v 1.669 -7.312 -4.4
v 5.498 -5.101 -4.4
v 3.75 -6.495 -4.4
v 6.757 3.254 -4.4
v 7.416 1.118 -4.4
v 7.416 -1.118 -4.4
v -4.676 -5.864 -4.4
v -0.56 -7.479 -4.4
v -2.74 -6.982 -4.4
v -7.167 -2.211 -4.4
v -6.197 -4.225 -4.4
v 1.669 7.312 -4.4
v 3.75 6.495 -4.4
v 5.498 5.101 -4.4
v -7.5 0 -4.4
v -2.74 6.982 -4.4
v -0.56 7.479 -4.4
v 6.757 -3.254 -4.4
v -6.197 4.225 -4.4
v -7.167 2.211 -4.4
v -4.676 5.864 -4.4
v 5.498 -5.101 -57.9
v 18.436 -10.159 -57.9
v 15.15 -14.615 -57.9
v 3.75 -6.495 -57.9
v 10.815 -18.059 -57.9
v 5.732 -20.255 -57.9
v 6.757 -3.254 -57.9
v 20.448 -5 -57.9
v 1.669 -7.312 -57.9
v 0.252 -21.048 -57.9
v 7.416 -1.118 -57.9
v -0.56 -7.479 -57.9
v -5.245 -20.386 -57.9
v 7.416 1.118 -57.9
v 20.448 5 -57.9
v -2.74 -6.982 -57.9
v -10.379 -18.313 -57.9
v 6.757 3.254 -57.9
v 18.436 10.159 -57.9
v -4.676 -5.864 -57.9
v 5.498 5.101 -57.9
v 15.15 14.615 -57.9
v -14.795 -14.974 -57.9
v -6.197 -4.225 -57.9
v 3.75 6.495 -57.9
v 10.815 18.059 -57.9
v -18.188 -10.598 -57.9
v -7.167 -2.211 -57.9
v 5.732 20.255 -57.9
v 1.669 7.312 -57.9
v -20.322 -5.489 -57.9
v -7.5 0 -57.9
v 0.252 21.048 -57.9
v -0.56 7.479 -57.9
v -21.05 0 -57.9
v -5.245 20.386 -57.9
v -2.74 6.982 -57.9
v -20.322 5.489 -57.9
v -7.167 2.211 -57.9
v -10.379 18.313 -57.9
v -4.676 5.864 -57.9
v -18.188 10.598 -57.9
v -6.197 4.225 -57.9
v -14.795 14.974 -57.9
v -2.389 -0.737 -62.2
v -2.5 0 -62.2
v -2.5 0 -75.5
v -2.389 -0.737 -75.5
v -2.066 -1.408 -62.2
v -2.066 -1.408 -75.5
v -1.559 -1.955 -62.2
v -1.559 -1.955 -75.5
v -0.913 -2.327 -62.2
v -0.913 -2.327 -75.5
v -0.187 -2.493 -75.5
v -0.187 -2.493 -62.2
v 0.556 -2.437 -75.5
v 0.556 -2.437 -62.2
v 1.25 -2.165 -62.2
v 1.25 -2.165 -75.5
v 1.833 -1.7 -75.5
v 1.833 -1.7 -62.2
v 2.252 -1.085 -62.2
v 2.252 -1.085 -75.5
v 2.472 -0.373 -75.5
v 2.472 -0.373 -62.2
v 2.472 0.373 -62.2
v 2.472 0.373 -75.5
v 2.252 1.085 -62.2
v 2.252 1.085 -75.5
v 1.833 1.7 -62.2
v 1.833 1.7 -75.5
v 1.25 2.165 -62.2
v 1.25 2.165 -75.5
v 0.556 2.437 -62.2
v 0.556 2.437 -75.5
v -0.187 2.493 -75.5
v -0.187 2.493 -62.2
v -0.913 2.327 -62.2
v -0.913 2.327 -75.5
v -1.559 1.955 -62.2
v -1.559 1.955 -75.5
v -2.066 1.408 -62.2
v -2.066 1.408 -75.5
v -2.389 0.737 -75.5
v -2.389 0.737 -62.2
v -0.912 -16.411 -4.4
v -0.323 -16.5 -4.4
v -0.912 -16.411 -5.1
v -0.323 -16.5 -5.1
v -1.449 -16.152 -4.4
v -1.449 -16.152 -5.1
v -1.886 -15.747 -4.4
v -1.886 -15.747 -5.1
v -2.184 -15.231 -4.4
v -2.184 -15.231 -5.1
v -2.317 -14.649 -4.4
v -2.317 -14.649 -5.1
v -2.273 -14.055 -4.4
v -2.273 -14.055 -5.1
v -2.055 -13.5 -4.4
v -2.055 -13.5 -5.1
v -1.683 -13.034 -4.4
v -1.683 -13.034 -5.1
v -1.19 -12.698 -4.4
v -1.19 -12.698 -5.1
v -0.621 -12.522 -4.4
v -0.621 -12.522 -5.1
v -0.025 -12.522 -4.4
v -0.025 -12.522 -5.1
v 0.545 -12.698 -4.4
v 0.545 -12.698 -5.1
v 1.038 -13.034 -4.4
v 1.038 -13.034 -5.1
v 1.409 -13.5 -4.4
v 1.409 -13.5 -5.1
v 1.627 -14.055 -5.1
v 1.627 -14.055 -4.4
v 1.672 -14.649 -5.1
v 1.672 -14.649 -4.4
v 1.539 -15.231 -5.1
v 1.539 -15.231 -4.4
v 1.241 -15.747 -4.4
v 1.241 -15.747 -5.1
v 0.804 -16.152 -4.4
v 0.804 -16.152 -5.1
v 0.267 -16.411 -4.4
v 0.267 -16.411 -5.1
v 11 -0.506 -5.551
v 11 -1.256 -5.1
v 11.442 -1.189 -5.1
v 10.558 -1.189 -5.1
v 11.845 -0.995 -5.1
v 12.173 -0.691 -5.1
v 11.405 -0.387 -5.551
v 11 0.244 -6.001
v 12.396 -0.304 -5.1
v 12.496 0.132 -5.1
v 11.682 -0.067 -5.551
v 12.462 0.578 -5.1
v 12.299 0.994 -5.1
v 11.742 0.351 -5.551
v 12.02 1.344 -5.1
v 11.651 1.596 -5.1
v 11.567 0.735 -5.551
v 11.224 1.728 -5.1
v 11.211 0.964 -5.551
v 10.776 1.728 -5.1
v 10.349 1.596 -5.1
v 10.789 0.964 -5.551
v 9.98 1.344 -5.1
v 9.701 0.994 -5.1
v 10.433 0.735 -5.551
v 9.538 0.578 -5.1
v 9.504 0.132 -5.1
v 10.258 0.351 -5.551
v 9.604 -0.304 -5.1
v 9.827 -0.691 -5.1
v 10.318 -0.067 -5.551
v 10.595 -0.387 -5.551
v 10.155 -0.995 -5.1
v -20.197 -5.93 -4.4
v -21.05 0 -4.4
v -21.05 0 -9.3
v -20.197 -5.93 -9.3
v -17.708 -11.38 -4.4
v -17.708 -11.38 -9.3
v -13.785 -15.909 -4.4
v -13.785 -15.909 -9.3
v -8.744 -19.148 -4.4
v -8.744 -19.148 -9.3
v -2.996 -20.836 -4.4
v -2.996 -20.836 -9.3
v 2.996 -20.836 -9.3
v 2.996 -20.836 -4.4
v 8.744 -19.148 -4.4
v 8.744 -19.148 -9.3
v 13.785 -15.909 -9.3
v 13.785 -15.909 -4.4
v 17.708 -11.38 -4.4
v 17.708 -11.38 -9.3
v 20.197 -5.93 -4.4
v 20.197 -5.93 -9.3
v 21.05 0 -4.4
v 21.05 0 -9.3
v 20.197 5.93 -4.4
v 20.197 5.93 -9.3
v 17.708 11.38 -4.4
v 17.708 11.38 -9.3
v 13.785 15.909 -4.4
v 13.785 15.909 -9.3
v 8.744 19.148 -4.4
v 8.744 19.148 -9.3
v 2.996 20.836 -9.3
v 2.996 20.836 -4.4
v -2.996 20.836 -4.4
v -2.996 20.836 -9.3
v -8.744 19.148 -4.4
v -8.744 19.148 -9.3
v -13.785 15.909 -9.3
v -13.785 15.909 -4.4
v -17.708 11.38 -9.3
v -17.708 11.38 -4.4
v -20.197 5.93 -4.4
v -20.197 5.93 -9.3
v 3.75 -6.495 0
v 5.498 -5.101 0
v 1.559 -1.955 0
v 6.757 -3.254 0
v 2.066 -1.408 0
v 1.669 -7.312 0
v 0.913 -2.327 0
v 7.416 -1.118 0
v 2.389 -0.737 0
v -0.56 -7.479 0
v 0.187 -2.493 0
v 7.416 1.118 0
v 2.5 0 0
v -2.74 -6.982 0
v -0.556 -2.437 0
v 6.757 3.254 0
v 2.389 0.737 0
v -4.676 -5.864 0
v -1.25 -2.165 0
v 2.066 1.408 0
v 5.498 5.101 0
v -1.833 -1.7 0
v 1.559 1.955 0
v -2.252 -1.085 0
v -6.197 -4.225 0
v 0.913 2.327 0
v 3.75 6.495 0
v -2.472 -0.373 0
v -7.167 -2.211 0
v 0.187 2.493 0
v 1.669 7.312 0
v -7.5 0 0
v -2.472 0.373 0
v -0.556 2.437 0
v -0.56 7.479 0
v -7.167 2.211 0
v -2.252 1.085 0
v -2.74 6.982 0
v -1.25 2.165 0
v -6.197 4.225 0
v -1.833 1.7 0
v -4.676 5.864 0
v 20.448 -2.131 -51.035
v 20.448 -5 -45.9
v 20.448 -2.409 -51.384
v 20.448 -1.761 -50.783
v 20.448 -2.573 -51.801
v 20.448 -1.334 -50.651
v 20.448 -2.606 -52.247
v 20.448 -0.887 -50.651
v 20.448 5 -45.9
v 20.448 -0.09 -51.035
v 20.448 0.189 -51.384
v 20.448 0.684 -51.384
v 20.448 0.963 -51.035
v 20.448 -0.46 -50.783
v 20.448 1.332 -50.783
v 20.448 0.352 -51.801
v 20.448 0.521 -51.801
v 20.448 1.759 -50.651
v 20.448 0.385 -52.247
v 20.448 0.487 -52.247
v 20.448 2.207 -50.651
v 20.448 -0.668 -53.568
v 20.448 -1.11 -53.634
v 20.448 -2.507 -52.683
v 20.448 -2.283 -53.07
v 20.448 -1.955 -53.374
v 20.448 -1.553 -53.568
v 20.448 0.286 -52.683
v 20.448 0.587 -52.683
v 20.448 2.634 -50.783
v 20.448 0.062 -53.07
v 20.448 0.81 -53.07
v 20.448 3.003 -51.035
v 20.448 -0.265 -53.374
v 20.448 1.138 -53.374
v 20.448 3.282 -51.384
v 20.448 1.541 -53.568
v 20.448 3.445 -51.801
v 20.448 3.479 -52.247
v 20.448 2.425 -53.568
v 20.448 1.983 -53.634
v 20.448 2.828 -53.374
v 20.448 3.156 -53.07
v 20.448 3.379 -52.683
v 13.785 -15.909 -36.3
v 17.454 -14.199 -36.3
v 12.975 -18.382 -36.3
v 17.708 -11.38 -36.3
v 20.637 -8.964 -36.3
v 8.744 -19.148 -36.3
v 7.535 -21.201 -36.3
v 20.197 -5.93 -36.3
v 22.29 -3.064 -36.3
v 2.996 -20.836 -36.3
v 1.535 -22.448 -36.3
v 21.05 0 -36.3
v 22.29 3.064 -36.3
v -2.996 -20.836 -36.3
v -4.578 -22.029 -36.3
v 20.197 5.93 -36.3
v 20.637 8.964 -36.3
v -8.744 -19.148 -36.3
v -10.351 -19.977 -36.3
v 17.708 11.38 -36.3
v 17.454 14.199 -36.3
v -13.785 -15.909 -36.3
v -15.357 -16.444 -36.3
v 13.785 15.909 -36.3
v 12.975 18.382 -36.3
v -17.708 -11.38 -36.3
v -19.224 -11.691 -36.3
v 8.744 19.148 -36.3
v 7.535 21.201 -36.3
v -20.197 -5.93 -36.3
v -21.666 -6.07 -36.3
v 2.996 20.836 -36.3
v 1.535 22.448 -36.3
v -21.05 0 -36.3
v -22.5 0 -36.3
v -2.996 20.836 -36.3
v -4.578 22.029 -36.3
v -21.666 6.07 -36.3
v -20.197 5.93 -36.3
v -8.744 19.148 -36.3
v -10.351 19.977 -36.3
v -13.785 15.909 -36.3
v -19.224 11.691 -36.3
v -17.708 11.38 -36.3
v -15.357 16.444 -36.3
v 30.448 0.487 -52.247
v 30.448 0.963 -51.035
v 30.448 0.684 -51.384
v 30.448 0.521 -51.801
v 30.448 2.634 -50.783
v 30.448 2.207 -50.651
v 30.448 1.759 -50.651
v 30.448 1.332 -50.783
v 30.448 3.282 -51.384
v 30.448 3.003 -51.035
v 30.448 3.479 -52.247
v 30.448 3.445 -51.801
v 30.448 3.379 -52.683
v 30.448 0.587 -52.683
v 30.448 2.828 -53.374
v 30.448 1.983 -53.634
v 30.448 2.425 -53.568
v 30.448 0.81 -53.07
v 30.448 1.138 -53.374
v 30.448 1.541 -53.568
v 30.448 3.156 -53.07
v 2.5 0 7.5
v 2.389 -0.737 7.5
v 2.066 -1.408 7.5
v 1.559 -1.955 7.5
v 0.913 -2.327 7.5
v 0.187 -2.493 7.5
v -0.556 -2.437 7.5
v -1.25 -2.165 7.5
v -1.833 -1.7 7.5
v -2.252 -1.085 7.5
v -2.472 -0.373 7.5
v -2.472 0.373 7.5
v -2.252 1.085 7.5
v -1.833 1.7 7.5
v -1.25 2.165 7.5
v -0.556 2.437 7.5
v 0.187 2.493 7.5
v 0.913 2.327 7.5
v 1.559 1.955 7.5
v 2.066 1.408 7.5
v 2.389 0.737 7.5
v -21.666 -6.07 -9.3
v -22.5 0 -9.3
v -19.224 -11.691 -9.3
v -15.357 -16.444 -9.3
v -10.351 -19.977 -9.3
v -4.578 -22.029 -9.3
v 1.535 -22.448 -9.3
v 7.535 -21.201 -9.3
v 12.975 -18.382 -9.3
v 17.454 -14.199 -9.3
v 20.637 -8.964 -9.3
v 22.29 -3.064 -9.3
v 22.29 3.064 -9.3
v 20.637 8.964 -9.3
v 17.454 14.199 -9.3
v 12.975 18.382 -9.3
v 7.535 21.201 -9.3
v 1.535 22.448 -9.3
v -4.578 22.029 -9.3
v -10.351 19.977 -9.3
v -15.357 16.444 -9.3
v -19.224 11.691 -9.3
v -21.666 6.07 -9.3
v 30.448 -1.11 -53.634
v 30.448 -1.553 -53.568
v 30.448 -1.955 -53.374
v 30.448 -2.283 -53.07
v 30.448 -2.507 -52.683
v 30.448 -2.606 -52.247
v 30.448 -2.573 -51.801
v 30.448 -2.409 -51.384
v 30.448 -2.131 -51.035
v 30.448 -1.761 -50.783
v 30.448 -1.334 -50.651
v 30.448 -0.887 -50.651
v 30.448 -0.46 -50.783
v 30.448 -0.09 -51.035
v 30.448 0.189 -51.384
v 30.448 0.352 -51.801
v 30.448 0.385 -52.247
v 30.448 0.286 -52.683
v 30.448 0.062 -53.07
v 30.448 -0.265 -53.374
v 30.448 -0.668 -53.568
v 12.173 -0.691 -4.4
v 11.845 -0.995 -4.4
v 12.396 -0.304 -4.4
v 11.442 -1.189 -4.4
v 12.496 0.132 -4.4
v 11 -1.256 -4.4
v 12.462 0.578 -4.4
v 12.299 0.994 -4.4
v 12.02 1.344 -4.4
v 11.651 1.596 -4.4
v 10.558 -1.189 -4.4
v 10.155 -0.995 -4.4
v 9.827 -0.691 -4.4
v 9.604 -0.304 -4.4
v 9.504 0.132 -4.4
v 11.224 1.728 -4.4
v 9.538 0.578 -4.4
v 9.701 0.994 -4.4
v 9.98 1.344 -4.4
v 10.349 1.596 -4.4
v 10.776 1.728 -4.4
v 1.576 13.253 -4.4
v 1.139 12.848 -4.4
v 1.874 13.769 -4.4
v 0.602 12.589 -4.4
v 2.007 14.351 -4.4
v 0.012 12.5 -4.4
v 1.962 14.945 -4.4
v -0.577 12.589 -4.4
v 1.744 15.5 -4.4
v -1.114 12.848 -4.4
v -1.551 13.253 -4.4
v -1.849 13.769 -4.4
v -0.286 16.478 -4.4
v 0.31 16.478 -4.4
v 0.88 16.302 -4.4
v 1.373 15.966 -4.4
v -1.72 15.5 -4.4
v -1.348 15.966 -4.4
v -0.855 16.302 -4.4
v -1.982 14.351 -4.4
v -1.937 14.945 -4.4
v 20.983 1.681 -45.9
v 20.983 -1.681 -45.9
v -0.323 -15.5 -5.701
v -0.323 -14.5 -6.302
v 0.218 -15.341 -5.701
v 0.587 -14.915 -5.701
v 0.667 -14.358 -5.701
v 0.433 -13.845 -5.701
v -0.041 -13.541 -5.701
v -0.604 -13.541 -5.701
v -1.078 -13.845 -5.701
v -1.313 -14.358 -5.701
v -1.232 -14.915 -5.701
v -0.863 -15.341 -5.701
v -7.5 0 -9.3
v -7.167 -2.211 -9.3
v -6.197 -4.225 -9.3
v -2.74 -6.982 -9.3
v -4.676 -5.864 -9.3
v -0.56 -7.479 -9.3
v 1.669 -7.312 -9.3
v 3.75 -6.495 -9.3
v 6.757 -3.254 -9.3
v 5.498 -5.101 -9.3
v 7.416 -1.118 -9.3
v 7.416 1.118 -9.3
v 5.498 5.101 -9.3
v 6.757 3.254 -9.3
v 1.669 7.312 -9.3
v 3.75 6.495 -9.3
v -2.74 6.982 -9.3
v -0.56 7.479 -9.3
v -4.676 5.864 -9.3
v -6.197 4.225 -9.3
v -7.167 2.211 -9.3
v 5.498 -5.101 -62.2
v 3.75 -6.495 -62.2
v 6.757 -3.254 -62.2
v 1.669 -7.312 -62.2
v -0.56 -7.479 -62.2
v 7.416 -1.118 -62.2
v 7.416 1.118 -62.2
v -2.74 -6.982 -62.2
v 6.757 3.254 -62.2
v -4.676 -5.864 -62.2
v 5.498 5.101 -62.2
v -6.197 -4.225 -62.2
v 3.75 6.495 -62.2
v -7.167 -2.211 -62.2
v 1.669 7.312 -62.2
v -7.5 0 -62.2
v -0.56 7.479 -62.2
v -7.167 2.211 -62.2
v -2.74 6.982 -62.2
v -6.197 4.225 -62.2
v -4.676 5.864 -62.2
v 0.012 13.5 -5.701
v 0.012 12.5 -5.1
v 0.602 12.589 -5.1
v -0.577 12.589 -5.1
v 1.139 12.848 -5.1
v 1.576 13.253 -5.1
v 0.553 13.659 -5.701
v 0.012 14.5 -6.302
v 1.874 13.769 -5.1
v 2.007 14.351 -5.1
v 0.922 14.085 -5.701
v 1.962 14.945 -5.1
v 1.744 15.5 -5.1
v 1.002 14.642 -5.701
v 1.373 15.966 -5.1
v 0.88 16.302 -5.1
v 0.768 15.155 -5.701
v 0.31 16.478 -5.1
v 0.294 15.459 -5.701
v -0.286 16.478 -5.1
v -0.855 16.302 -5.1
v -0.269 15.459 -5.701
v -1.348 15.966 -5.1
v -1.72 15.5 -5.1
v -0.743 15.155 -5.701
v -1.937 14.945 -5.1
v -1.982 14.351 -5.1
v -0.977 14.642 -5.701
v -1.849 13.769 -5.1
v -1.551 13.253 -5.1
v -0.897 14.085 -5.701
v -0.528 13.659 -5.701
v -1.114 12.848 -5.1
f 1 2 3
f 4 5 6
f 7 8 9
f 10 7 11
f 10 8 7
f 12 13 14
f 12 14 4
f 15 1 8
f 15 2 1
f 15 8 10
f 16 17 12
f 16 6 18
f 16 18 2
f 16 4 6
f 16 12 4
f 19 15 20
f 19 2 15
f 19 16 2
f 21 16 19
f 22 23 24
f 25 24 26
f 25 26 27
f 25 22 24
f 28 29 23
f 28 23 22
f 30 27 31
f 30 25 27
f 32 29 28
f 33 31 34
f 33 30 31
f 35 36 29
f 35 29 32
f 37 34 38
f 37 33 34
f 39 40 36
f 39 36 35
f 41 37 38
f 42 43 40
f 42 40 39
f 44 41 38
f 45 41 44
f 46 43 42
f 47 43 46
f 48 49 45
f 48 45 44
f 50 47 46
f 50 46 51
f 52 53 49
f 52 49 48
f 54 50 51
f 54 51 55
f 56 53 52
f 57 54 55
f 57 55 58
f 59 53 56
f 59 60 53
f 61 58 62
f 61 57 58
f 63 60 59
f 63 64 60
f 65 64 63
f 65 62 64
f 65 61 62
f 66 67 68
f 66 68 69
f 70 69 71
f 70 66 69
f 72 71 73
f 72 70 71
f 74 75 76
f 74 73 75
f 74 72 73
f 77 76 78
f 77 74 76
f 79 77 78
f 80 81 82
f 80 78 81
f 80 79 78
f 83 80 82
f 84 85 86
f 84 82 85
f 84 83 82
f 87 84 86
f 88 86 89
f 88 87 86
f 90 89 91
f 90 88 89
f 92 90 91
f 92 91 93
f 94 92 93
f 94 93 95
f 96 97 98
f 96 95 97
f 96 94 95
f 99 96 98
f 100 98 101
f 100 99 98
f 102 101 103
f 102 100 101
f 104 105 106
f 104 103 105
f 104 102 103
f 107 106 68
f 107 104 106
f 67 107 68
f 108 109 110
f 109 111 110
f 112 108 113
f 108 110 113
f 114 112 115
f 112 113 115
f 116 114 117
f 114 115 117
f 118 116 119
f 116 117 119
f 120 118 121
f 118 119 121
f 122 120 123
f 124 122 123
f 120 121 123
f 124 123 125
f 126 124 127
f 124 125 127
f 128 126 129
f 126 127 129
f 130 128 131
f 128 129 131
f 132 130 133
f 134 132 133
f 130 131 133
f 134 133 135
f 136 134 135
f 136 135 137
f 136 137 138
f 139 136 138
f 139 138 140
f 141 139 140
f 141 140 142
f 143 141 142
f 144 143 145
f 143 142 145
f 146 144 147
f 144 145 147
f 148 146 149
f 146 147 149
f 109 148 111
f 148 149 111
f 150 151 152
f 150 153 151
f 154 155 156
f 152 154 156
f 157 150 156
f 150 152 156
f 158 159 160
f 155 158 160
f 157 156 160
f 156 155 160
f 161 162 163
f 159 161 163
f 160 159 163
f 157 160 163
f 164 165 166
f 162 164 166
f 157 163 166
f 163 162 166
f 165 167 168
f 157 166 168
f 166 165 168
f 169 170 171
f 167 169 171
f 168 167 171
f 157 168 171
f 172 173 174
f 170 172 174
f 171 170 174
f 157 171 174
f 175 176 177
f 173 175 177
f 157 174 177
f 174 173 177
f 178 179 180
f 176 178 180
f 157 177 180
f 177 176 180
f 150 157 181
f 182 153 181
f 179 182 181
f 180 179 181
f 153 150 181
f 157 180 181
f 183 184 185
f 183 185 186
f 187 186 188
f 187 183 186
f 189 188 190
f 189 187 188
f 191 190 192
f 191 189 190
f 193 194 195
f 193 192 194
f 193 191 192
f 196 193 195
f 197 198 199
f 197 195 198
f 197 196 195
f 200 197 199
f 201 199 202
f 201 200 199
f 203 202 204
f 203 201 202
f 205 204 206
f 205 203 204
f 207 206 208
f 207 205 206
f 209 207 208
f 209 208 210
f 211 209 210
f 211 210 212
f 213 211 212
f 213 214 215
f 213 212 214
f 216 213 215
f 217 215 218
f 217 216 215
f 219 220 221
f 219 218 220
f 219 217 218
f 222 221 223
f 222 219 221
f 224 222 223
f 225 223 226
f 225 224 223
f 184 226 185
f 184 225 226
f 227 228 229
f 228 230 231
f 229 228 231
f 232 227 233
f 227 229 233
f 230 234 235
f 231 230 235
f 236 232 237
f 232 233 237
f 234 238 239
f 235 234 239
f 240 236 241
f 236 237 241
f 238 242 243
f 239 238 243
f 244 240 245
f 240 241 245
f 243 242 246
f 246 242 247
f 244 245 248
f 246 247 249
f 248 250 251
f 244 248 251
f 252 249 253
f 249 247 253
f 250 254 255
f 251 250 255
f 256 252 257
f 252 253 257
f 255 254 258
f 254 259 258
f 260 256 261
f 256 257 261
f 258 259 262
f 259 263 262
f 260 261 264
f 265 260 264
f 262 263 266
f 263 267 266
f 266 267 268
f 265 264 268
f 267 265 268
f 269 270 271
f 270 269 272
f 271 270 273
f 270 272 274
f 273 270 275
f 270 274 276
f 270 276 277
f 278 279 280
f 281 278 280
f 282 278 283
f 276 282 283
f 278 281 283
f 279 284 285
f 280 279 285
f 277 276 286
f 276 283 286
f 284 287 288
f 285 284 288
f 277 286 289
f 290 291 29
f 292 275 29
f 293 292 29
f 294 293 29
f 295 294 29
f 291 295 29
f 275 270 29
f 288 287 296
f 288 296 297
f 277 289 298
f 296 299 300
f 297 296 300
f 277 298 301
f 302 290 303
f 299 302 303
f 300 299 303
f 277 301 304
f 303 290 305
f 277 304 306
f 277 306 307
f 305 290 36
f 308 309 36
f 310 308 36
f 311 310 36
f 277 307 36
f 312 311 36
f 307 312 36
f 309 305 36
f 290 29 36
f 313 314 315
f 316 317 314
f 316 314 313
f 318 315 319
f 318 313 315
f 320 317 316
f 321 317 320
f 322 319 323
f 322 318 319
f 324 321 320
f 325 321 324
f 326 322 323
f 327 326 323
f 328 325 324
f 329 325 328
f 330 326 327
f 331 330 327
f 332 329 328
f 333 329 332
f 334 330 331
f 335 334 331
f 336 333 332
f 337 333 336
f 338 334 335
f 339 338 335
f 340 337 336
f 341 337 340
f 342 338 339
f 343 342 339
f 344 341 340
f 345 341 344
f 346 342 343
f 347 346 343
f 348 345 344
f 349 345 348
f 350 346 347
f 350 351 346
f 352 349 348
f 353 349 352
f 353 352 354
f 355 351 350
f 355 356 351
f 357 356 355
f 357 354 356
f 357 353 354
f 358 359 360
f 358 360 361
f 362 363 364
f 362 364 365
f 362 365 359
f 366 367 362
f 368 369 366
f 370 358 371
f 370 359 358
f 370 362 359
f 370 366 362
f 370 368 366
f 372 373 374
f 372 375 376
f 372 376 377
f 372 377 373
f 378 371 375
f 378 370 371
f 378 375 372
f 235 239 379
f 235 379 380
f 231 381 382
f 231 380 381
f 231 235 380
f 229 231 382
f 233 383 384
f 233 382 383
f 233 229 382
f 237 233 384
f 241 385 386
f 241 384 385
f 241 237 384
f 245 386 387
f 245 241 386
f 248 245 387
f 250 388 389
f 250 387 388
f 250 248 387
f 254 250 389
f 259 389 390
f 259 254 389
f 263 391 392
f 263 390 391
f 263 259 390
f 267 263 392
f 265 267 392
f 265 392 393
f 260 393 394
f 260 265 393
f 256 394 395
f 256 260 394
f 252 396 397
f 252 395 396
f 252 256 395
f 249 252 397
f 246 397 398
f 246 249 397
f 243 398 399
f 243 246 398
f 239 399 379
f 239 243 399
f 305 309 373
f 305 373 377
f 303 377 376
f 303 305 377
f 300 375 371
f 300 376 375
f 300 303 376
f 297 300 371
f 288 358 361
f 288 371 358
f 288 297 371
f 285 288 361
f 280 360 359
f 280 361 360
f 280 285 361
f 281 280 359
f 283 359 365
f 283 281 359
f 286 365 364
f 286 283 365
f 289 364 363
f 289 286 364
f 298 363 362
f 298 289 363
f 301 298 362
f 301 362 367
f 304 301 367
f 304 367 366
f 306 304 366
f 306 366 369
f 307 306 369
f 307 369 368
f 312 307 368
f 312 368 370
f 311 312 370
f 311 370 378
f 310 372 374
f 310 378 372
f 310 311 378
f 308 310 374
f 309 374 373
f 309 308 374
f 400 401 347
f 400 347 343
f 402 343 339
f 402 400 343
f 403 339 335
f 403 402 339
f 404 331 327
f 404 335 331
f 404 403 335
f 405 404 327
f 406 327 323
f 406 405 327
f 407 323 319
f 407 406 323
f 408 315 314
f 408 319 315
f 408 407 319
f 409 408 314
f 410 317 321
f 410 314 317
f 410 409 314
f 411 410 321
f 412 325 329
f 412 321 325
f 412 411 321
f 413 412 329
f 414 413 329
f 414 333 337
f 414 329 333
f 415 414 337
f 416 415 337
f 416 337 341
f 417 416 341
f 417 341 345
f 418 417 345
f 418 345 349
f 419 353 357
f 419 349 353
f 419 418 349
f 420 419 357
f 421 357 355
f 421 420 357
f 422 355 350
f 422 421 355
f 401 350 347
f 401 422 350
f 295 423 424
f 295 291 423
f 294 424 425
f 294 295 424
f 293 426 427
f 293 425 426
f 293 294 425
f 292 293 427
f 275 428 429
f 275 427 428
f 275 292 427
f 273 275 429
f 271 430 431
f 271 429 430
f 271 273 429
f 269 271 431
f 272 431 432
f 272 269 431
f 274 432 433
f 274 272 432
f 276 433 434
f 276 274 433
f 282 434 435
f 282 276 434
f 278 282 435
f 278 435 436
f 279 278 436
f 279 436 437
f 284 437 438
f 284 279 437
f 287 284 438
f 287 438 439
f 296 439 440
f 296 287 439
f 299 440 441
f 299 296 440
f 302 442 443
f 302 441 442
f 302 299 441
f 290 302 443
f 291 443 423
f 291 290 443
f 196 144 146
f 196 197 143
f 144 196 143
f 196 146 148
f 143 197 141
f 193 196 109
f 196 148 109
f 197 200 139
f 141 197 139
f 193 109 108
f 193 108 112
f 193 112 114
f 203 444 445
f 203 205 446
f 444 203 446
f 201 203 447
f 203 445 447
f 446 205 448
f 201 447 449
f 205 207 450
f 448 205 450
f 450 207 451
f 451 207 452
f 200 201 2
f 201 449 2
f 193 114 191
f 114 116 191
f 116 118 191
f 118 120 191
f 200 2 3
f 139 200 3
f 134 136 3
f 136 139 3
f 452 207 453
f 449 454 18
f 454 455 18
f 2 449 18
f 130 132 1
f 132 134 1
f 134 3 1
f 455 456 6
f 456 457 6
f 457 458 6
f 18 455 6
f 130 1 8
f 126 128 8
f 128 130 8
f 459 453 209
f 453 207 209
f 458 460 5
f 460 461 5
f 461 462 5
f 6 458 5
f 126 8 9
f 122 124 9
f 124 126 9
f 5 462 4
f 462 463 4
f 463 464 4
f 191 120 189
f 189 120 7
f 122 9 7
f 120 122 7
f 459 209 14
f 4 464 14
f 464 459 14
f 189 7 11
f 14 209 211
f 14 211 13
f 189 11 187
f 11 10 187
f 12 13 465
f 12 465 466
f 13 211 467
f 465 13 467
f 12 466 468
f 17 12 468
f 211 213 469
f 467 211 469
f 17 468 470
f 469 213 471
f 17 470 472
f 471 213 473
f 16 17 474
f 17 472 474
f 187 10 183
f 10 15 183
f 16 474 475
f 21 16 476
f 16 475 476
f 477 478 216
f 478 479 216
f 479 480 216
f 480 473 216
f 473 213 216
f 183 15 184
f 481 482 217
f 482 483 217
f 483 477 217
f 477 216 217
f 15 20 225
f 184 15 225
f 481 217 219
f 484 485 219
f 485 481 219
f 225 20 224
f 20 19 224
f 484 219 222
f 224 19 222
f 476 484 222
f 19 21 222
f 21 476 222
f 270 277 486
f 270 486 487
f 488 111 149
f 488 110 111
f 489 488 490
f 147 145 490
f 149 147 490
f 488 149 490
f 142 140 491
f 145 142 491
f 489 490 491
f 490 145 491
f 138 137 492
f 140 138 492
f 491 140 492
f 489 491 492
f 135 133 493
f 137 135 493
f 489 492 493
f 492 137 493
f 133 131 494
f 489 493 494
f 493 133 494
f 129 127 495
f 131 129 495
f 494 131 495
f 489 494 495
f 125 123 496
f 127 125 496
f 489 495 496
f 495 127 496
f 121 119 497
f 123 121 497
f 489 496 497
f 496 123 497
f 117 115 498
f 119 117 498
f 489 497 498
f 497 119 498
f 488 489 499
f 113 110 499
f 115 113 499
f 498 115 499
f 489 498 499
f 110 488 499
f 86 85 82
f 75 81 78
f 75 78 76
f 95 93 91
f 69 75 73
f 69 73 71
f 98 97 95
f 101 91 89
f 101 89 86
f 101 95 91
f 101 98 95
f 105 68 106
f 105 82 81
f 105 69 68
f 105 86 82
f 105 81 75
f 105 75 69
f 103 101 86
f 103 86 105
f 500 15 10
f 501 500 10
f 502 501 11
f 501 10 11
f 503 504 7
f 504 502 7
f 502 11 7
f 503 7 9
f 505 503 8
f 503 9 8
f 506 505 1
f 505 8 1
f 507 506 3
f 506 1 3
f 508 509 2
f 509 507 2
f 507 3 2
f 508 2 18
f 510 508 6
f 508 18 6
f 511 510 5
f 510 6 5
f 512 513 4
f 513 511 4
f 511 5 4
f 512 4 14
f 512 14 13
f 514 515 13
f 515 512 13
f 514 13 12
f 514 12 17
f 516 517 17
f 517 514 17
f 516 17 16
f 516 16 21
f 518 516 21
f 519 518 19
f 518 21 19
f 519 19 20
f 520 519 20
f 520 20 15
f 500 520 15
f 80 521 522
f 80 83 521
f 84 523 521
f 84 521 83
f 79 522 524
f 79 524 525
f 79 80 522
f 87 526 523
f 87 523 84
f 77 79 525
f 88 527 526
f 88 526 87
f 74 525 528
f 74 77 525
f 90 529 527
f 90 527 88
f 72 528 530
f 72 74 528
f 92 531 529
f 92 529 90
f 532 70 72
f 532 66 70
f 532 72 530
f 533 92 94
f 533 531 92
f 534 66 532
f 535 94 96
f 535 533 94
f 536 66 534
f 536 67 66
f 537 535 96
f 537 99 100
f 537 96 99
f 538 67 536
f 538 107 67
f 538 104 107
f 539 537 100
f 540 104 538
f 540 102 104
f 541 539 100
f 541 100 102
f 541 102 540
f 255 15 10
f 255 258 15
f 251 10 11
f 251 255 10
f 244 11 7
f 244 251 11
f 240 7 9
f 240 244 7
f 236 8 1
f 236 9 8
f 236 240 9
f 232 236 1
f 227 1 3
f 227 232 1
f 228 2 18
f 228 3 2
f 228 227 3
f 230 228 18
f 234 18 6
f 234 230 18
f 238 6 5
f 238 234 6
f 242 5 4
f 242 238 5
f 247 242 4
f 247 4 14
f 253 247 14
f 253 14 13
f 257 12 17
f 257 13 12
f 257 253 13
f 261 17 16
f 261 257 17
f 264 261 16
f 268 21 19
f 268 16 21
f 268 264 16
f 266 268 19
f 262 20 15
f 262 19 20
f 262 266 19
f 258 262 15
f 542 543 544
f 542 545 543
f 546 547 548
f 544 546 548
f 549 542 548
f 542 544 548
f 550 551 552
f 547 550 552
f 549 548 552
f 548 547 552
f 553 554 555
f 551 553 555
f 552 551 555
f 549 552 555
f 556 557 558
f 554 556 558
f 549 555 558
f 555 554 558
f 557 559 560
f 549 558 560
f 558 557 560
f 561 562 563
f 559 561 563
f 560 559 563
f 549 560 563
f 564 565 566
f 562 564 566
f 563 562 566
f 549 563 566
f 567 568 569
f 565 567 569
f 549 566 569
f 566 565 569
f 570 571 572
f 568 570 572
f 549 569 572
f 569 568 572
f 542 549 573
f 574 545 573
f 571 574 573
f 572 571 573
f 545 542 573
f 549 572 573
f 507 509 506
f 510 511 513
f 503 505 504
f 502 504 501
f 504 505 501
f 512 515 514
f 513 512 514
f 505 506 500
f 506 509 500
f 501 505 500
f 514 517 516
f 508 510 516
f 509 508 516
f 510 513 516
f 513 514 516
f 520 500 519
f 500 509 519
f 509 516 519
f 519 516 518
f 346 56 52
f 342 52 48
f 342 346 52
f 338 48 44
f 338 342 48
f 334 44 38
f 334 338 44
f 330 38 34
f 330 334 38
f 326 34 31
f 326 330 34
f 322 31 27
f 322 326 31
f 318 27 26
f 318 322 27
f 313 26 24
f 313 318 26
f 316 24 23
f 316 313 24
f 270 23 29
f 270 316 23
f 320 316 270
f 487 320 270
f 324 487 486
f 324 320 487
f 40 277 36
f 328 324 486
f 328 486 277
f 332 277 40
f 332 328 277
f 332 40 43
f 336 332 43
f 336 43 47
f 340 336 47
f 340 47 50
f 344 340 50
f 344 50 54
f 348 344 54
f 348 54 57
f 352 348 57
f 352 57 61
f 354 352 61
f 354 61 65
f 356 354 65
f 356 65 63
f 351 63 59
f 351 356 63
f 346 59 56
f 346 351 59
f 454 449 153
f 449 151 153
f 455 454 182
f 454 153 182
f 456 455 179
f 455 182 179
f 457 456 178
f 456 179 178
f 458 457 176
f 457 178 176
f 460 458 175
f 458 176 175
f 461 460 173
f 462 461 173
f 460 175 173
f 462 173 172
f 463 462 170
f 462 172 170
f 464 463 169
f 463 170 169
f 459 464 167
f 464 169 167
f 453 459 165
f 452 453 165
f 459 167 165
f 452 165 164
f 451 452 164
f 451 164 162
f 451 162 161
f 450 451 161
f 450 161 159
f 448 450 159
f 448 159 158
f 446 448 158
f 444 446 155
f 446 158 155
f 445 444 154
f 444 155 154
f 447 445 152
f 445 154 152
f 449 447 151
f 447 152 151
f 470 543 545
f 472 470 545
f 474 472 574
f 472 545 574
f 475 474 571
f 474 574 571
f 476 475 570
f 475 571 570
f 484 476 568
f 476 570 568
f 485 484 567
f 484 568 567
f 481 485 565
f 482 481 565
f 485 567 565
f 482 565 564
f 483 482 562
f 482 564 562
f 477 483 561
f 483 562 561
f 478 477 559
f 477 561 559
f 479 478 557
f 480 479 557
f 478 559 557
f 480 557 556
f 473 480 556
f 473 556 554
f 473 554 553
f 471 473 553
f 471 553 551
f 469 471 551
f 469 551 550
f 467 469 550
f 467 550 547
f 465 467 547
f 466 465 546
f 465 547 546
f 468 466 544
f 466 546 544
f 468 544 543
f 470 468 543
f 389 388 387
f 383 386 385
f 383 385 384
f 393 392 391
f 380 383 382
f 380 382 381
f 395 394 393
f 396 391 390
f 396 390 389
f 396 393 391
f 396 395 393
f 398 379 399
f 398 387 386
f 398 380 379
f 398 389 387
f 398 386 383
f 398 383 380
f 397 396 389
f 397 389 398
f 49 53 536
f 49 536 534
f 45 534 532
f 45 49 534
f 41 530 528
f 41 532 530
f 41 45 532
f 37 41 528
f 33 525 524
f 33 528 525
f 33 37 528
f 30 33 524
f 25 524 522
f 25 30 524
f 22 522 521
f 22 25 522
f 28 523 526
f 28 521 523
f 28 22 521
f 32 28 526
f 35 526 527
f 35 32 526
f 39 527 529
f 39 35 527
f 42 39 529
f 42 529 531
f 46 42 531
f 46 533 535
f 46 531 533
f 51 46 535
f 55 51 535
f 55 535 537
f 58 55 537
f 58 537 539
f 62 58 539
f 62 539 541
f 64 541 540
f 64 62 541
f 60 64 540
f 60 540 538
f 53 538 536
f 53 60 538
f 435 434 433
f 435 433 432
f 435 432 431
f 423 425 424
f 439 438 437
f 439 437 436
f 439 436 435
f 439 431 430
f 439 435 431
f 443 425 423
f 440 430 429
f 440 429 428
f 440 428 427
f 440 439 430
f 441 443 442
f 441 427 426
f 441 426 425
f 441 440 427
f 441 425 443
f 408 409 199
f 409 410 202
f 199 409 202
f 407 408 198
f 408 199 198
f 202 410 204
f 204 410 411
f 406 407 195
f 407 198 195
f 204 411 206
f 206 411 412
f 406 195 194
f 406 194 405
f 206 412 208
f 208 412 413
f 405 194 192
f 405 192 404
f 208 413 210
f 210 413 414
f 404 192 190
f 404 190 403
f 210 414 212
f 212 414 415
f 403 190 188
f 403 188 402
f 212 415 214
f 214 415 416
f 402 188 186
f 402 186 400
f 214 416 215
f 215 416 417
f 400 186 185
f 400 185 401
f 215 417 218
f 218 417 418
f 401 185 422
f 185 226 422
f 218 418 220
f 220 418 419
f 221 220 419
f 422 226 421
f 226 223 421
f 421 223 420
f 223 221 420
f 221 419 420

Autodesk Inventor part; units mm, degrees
ref_plane "YZ Plane" through (0, 0, 0) normal (1, 0, 0) x (0, 1, 0)
ref_plane "XZ Plane" through (0, 0, 0) normal (0, 1, 0) x (-1, 0, 0)
ref_plane "XY Plane" through (0, 0, 0) normal (0, 0, 1) x (1, 0, 0)
sketch "スケッチ1" plane through (0, 0, 0) normal (0, 0, 1) x (1, 0, 0)
  circle A0 centre (0, 0) radius 2.5
  dimension "d0" = 5
extrude "押し出し1" add sketch "スケッチ1" along normal blind 7.5
sketch "スケッチ2" plane through (0, 0, 0) normal (0, 0, -1) x (-1, 0, 0)
  circle A0 centre (0, 0) radius 7.5
  dimension "d3" = 15
extrude "押し出し2" add sketch "スケッチ2" along normal blind 4.4
sketch "スケッチ3" plane through (0, 0, -4.4) normal (0, 0, -1) x (-1, 0, 0)
  circle A0 centre (0, 0) radius 7.5 projected
  circle A1 centre (0, 0) radius 21.05
  dimension "d6" = 42.1
extrude "押し出し3" add sketch "スケッチ3" along normal blind 4.9
sketch "スケッチ4" plane through (0, 0, -9.3) normal (0, 0, -1) x (-1, 0, 0)
  circle A0 centre (0, 0) radius 22.5
  dimension "d9" = 45
extrude "押し出し4" add sketch "スケッチ4" along normal blind 27
sketch "スケッチ5" plane through (0, 0, -36.3) normal (0, 0, -1) x (-1, 0, 0)
  circle A0 centre (0, 0) radius 21.05
  dimension "d12" = 42.1
extrude "押し出し5" add sketch "スケッチ5" along normal blind 21.6
sketch "スケッチ6" plane through (0, 0, -57.9) normal (0, 0, -1) x (-1, 0, 0)
  circle A0 centre (0, 0) radius 7.5
  dimension "d15" = 15
extrude "押し出し6" add sketch "スケッチ6" along normal blind 4.3
sketch "スケッチ7" plane through (0, 0, -62.2) normal (0, 0, -1) x (-1, 0, 0)
  circle A0 centre (0, 0) radius 2.5
  dimension "d18" = 5
extrude "押し出し7" add sketch "スケッチ7" along normal blind 13.3
sketch "スケッチ8" plane through (0, 0, -4.4) normal (0, 0, 1) x (1, 0, 0)
  point P0 (0, 0)
  point P1 (0.0124, 14.5)
  point P2 (-0.3227, -14.5)
  dimension "d35" = 14.5
  dimension "d36" = 14.5
hole "穴1" at (0.0124, 14.5, -4.4) at (-0.3227, -14.5, -4.4) direction (0, 0, -1) diameter 4 depth 0.7 tip angle 118
sketch "スケッチ9" plane through (0, 0, -4.4) normal (0, 0, 1) x (1, 0, 0)
  point P0 (0, 0)
  point P1 (11, 0.2443)
  dimension "d37" = 11
hole "穴2" at (11, 0.2443, -4.4) direction (0, 0, -1) diameter 3 depth 0.7 tip angle 118
sketch "スケッチ10" plane through (0, 0, -57.9) normal (0, 0, -1) x (-1, 0, 0)
  circle A0 centre (0, 0) radius 21.05 projected
  arc A1 (-20.4476, 5) -> (-20.4476, -5) centre (0, 0) ccw
  line L0 (-20.4476, -5) -> (-20.4476, 5)
  dimension "d38" = 5
  dimension "d39" = 5
extrude "押し出し8" cut sketch "スケッチ10" against normal blind 12 contours L0 A0 picked at (-20.626, 0.5603)
sketch "スケッチ11" plane through (20.4476, -5, -57.9) normal (1, 0, 0) x (0, 0, -1)
  circle A0 centre (-5.7655, 6.983) radius 1.5
  circle A1 centre (-5.7655, 3.8896) radius 1.5
  point P0 (-57.9, 5)
  dimension "d42" = 3
  dimension "d43" = 3
extrude "押し出し9" add sketch "スケッチ11" along normal blind 10
equation "\"d36\" = d35"
equation "\"d39\" = d38"
properties part number "モータ RZ-735VA" material "ステンレス鋼"
